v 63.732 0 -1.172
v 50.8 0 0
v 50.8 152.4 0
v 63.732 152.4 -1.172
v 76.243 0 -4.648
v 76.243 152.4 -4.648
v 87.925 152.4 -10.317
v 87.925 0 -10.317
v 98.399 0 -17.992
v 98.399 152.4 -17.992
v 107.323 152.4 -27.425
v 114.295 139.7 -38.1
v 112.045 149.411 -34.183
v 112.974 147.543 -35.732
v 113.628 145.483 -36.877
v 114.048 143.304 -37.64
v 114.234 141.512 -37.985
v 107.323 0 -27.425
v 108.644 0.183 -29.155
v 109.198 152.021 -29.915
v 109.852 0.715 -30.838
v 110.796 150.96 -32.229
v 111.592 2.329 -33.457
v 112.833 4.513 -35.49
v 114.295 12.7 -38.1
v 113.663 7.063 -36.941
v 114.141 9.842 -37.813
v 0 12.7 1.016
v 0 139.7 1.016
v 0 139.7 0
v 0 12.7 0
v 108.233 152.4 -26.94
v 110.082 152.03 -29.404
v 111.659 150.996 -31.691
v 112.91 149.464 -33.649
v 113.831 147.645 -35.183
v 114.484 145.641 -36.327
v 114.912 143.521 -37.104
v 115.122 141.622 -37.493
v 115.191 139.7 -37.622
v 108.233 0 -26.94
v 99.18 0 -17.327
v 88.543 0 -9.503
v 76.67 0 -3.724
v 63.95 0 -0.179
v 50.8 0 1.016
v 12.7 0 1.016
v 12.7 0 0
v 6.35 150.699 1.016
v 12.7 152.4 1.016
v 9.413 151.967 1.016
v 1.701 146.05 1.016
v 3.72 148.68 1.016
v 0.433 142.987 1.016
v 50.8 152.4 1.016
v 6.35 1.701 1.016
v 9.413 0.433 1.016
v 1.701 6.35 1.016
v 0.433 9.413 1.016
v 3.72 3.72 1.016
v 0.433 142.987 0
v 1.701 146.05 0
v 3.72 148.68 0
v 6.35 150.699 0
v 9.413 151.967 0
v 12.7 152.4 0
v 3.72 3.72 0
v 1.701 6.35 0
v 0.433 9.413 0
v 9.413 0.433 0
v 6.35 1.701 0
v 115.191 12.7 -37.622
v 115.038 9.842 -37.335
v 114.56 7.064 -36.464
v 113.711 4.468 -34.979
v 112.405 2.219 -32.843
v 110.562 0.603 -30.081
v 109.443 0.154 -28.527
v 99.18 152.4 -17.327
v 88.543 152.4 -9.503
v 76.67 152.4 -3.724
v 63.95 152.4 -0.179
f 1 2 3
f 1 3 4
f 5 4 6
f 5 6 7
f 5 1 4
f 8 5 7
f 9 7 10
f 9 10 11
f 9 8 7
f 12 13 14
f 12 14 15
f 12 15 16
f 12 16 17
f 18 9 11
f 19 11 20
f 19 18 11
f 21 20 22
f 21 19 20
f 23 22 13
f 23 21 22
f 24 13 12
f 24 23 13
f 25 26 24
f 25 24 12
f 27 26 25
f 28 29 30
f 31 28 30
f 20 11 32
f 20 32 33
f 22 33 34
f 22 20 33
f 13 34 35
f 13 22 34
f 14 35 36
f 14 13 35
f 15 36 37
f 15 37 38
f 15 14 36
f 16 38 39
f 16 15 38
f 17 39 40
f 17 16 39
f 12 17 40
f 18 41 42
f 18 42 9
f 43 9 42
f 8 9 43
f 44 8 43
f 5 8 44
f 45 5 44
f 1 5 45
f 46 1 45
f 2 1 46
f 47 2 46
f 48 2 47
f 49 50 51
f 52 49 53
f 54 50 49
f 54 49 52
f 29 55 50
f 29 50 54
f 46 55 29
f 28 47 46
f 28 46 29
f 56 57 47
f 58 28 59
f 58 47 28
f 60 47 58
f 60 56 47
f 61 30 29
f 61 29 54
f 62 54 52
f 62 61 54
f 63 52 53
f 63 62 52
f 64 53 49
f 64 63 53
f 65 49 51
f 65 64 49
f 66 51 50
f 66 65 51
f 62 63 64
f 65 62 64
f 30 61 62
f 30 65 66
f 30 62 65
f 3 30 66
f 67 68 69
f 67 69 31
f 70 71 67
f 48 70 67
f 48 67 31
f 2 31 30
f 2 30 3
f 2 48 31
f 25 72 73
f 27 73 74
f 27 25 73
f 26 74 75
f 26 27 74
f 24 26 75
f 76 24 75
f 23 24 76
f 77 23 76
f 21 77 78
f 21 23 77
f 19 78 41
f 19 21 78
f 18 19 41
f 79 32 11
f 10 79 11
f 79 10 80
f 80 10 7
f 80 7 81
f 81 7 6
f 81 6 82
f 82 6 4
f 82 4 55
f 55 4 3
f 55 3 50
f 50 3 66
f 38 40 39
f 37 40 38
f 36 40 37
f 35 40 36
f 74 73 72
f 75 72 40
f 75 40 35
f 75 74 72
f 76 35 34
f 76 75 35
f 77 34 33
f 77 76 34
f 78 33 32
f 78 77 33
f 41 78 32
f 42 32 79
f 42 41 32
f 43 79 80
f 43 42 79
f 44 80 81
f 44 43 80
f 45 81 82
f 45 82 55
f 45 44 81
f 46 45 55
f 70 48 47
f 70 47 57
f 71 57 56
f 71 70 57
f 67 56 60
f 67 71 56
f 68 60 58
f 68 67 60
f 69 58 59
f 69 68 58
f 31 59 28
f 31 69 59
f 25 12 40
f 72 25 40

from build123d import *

# Parameters (mm, degrees)
EXTRUDE_THIN1_DEPTH = 152.4
FILLET1_START       = -34.928197123
FILLET1_DEPTH       = 36.928197123
FILLET1_START_2     = 1.736605499
FILLET1_2_DEPTH     = 83.263394501


with BuildPart() as part:
    # Sketch1 → Extrude-Thin1 (new body)
    with BuildSketch(Plane(origin=(0, 0, 0), x_dir=(1, 0, 0), z_dir=(0, 1, 0))):
        with BuildLine():
            Line((0, 0), (50.8, 0))
            ThreePointArc((50.8, 0), (87.824366436, 10.255859386), (114.294919797, 38.1))
            Line((114.294919797, 38.1), (115.191424136, 37.621945641))
            ThreePointArc((115.191424136, 37.621945641), (88.347124875, 9.384665025), (50.8, -1.016))
            Line((50.8, -1.016), (0, -1.016))
            Line((0, -1.016), (0, 0))
        make_face()
    extrude(amount=EXTRUDE_THIN1_DEPTH)

    # Fillet1: read off the stored shape, not the designer's step
    # Fillet1 outline → Fillet1 (cut)
    with BuildSketch(Plane.XY.offset(FILLET1_START)):
        with BuildLine():
            Line((0, 152.4), (0, 139.7))
            ThreePointArc((0, 139.7), (3.719743879, 148.680256121), (12.7, 152.4))
            Line((12.7, 152.4), (0, 152.4))
        make_face()
        with BuildLine():
            ThreePointArc((12.7, 0), (3.719743879, 3.719743879), (0, 12.7))
            Line((0, 12.7), (0, 0))
            Line((0, 0), (12.7, 0))
        make_face()
    extrude(amount=FILLET1_DEPTH, mode=Mode.SUBTRACT)

    # Fillet1 2 outline → Fillet1 2 (cut)
    with BuildSketch(Plane(origin=(0, 0, 0), x_dir=(0.4705259442287449, 0, -0.8823861602539153), z_dir=(0.8823861602539151, 0, 0.47052594422874505)).offset(FILLET1_START_2)):
        with BuildLine():
            Line((87.397637764, 0), (87.397637764, 12.7))
            ThreePointArc((87.397637764, 12.7), (83.677893885, 3.719743879), (74.697637764, 0))
            Line((74.697637764, 0), (87.397637764, 0))
        make_face()
        with BuildLine():
            ThreePointArc((74.697637764, 152.4), (83.677893885, 148.680256121), (87.397637764, 139.7))
            Line((87.397637764, 139.7), (87.397637764, 152.4))
            Line((87.397637764, 152.4), (74.697637764, 152.4))
        make_face()
    extrude(amount=FILLET1_2_DEPTH, mode=Mode.SUBTRACT)


solid = part.part
